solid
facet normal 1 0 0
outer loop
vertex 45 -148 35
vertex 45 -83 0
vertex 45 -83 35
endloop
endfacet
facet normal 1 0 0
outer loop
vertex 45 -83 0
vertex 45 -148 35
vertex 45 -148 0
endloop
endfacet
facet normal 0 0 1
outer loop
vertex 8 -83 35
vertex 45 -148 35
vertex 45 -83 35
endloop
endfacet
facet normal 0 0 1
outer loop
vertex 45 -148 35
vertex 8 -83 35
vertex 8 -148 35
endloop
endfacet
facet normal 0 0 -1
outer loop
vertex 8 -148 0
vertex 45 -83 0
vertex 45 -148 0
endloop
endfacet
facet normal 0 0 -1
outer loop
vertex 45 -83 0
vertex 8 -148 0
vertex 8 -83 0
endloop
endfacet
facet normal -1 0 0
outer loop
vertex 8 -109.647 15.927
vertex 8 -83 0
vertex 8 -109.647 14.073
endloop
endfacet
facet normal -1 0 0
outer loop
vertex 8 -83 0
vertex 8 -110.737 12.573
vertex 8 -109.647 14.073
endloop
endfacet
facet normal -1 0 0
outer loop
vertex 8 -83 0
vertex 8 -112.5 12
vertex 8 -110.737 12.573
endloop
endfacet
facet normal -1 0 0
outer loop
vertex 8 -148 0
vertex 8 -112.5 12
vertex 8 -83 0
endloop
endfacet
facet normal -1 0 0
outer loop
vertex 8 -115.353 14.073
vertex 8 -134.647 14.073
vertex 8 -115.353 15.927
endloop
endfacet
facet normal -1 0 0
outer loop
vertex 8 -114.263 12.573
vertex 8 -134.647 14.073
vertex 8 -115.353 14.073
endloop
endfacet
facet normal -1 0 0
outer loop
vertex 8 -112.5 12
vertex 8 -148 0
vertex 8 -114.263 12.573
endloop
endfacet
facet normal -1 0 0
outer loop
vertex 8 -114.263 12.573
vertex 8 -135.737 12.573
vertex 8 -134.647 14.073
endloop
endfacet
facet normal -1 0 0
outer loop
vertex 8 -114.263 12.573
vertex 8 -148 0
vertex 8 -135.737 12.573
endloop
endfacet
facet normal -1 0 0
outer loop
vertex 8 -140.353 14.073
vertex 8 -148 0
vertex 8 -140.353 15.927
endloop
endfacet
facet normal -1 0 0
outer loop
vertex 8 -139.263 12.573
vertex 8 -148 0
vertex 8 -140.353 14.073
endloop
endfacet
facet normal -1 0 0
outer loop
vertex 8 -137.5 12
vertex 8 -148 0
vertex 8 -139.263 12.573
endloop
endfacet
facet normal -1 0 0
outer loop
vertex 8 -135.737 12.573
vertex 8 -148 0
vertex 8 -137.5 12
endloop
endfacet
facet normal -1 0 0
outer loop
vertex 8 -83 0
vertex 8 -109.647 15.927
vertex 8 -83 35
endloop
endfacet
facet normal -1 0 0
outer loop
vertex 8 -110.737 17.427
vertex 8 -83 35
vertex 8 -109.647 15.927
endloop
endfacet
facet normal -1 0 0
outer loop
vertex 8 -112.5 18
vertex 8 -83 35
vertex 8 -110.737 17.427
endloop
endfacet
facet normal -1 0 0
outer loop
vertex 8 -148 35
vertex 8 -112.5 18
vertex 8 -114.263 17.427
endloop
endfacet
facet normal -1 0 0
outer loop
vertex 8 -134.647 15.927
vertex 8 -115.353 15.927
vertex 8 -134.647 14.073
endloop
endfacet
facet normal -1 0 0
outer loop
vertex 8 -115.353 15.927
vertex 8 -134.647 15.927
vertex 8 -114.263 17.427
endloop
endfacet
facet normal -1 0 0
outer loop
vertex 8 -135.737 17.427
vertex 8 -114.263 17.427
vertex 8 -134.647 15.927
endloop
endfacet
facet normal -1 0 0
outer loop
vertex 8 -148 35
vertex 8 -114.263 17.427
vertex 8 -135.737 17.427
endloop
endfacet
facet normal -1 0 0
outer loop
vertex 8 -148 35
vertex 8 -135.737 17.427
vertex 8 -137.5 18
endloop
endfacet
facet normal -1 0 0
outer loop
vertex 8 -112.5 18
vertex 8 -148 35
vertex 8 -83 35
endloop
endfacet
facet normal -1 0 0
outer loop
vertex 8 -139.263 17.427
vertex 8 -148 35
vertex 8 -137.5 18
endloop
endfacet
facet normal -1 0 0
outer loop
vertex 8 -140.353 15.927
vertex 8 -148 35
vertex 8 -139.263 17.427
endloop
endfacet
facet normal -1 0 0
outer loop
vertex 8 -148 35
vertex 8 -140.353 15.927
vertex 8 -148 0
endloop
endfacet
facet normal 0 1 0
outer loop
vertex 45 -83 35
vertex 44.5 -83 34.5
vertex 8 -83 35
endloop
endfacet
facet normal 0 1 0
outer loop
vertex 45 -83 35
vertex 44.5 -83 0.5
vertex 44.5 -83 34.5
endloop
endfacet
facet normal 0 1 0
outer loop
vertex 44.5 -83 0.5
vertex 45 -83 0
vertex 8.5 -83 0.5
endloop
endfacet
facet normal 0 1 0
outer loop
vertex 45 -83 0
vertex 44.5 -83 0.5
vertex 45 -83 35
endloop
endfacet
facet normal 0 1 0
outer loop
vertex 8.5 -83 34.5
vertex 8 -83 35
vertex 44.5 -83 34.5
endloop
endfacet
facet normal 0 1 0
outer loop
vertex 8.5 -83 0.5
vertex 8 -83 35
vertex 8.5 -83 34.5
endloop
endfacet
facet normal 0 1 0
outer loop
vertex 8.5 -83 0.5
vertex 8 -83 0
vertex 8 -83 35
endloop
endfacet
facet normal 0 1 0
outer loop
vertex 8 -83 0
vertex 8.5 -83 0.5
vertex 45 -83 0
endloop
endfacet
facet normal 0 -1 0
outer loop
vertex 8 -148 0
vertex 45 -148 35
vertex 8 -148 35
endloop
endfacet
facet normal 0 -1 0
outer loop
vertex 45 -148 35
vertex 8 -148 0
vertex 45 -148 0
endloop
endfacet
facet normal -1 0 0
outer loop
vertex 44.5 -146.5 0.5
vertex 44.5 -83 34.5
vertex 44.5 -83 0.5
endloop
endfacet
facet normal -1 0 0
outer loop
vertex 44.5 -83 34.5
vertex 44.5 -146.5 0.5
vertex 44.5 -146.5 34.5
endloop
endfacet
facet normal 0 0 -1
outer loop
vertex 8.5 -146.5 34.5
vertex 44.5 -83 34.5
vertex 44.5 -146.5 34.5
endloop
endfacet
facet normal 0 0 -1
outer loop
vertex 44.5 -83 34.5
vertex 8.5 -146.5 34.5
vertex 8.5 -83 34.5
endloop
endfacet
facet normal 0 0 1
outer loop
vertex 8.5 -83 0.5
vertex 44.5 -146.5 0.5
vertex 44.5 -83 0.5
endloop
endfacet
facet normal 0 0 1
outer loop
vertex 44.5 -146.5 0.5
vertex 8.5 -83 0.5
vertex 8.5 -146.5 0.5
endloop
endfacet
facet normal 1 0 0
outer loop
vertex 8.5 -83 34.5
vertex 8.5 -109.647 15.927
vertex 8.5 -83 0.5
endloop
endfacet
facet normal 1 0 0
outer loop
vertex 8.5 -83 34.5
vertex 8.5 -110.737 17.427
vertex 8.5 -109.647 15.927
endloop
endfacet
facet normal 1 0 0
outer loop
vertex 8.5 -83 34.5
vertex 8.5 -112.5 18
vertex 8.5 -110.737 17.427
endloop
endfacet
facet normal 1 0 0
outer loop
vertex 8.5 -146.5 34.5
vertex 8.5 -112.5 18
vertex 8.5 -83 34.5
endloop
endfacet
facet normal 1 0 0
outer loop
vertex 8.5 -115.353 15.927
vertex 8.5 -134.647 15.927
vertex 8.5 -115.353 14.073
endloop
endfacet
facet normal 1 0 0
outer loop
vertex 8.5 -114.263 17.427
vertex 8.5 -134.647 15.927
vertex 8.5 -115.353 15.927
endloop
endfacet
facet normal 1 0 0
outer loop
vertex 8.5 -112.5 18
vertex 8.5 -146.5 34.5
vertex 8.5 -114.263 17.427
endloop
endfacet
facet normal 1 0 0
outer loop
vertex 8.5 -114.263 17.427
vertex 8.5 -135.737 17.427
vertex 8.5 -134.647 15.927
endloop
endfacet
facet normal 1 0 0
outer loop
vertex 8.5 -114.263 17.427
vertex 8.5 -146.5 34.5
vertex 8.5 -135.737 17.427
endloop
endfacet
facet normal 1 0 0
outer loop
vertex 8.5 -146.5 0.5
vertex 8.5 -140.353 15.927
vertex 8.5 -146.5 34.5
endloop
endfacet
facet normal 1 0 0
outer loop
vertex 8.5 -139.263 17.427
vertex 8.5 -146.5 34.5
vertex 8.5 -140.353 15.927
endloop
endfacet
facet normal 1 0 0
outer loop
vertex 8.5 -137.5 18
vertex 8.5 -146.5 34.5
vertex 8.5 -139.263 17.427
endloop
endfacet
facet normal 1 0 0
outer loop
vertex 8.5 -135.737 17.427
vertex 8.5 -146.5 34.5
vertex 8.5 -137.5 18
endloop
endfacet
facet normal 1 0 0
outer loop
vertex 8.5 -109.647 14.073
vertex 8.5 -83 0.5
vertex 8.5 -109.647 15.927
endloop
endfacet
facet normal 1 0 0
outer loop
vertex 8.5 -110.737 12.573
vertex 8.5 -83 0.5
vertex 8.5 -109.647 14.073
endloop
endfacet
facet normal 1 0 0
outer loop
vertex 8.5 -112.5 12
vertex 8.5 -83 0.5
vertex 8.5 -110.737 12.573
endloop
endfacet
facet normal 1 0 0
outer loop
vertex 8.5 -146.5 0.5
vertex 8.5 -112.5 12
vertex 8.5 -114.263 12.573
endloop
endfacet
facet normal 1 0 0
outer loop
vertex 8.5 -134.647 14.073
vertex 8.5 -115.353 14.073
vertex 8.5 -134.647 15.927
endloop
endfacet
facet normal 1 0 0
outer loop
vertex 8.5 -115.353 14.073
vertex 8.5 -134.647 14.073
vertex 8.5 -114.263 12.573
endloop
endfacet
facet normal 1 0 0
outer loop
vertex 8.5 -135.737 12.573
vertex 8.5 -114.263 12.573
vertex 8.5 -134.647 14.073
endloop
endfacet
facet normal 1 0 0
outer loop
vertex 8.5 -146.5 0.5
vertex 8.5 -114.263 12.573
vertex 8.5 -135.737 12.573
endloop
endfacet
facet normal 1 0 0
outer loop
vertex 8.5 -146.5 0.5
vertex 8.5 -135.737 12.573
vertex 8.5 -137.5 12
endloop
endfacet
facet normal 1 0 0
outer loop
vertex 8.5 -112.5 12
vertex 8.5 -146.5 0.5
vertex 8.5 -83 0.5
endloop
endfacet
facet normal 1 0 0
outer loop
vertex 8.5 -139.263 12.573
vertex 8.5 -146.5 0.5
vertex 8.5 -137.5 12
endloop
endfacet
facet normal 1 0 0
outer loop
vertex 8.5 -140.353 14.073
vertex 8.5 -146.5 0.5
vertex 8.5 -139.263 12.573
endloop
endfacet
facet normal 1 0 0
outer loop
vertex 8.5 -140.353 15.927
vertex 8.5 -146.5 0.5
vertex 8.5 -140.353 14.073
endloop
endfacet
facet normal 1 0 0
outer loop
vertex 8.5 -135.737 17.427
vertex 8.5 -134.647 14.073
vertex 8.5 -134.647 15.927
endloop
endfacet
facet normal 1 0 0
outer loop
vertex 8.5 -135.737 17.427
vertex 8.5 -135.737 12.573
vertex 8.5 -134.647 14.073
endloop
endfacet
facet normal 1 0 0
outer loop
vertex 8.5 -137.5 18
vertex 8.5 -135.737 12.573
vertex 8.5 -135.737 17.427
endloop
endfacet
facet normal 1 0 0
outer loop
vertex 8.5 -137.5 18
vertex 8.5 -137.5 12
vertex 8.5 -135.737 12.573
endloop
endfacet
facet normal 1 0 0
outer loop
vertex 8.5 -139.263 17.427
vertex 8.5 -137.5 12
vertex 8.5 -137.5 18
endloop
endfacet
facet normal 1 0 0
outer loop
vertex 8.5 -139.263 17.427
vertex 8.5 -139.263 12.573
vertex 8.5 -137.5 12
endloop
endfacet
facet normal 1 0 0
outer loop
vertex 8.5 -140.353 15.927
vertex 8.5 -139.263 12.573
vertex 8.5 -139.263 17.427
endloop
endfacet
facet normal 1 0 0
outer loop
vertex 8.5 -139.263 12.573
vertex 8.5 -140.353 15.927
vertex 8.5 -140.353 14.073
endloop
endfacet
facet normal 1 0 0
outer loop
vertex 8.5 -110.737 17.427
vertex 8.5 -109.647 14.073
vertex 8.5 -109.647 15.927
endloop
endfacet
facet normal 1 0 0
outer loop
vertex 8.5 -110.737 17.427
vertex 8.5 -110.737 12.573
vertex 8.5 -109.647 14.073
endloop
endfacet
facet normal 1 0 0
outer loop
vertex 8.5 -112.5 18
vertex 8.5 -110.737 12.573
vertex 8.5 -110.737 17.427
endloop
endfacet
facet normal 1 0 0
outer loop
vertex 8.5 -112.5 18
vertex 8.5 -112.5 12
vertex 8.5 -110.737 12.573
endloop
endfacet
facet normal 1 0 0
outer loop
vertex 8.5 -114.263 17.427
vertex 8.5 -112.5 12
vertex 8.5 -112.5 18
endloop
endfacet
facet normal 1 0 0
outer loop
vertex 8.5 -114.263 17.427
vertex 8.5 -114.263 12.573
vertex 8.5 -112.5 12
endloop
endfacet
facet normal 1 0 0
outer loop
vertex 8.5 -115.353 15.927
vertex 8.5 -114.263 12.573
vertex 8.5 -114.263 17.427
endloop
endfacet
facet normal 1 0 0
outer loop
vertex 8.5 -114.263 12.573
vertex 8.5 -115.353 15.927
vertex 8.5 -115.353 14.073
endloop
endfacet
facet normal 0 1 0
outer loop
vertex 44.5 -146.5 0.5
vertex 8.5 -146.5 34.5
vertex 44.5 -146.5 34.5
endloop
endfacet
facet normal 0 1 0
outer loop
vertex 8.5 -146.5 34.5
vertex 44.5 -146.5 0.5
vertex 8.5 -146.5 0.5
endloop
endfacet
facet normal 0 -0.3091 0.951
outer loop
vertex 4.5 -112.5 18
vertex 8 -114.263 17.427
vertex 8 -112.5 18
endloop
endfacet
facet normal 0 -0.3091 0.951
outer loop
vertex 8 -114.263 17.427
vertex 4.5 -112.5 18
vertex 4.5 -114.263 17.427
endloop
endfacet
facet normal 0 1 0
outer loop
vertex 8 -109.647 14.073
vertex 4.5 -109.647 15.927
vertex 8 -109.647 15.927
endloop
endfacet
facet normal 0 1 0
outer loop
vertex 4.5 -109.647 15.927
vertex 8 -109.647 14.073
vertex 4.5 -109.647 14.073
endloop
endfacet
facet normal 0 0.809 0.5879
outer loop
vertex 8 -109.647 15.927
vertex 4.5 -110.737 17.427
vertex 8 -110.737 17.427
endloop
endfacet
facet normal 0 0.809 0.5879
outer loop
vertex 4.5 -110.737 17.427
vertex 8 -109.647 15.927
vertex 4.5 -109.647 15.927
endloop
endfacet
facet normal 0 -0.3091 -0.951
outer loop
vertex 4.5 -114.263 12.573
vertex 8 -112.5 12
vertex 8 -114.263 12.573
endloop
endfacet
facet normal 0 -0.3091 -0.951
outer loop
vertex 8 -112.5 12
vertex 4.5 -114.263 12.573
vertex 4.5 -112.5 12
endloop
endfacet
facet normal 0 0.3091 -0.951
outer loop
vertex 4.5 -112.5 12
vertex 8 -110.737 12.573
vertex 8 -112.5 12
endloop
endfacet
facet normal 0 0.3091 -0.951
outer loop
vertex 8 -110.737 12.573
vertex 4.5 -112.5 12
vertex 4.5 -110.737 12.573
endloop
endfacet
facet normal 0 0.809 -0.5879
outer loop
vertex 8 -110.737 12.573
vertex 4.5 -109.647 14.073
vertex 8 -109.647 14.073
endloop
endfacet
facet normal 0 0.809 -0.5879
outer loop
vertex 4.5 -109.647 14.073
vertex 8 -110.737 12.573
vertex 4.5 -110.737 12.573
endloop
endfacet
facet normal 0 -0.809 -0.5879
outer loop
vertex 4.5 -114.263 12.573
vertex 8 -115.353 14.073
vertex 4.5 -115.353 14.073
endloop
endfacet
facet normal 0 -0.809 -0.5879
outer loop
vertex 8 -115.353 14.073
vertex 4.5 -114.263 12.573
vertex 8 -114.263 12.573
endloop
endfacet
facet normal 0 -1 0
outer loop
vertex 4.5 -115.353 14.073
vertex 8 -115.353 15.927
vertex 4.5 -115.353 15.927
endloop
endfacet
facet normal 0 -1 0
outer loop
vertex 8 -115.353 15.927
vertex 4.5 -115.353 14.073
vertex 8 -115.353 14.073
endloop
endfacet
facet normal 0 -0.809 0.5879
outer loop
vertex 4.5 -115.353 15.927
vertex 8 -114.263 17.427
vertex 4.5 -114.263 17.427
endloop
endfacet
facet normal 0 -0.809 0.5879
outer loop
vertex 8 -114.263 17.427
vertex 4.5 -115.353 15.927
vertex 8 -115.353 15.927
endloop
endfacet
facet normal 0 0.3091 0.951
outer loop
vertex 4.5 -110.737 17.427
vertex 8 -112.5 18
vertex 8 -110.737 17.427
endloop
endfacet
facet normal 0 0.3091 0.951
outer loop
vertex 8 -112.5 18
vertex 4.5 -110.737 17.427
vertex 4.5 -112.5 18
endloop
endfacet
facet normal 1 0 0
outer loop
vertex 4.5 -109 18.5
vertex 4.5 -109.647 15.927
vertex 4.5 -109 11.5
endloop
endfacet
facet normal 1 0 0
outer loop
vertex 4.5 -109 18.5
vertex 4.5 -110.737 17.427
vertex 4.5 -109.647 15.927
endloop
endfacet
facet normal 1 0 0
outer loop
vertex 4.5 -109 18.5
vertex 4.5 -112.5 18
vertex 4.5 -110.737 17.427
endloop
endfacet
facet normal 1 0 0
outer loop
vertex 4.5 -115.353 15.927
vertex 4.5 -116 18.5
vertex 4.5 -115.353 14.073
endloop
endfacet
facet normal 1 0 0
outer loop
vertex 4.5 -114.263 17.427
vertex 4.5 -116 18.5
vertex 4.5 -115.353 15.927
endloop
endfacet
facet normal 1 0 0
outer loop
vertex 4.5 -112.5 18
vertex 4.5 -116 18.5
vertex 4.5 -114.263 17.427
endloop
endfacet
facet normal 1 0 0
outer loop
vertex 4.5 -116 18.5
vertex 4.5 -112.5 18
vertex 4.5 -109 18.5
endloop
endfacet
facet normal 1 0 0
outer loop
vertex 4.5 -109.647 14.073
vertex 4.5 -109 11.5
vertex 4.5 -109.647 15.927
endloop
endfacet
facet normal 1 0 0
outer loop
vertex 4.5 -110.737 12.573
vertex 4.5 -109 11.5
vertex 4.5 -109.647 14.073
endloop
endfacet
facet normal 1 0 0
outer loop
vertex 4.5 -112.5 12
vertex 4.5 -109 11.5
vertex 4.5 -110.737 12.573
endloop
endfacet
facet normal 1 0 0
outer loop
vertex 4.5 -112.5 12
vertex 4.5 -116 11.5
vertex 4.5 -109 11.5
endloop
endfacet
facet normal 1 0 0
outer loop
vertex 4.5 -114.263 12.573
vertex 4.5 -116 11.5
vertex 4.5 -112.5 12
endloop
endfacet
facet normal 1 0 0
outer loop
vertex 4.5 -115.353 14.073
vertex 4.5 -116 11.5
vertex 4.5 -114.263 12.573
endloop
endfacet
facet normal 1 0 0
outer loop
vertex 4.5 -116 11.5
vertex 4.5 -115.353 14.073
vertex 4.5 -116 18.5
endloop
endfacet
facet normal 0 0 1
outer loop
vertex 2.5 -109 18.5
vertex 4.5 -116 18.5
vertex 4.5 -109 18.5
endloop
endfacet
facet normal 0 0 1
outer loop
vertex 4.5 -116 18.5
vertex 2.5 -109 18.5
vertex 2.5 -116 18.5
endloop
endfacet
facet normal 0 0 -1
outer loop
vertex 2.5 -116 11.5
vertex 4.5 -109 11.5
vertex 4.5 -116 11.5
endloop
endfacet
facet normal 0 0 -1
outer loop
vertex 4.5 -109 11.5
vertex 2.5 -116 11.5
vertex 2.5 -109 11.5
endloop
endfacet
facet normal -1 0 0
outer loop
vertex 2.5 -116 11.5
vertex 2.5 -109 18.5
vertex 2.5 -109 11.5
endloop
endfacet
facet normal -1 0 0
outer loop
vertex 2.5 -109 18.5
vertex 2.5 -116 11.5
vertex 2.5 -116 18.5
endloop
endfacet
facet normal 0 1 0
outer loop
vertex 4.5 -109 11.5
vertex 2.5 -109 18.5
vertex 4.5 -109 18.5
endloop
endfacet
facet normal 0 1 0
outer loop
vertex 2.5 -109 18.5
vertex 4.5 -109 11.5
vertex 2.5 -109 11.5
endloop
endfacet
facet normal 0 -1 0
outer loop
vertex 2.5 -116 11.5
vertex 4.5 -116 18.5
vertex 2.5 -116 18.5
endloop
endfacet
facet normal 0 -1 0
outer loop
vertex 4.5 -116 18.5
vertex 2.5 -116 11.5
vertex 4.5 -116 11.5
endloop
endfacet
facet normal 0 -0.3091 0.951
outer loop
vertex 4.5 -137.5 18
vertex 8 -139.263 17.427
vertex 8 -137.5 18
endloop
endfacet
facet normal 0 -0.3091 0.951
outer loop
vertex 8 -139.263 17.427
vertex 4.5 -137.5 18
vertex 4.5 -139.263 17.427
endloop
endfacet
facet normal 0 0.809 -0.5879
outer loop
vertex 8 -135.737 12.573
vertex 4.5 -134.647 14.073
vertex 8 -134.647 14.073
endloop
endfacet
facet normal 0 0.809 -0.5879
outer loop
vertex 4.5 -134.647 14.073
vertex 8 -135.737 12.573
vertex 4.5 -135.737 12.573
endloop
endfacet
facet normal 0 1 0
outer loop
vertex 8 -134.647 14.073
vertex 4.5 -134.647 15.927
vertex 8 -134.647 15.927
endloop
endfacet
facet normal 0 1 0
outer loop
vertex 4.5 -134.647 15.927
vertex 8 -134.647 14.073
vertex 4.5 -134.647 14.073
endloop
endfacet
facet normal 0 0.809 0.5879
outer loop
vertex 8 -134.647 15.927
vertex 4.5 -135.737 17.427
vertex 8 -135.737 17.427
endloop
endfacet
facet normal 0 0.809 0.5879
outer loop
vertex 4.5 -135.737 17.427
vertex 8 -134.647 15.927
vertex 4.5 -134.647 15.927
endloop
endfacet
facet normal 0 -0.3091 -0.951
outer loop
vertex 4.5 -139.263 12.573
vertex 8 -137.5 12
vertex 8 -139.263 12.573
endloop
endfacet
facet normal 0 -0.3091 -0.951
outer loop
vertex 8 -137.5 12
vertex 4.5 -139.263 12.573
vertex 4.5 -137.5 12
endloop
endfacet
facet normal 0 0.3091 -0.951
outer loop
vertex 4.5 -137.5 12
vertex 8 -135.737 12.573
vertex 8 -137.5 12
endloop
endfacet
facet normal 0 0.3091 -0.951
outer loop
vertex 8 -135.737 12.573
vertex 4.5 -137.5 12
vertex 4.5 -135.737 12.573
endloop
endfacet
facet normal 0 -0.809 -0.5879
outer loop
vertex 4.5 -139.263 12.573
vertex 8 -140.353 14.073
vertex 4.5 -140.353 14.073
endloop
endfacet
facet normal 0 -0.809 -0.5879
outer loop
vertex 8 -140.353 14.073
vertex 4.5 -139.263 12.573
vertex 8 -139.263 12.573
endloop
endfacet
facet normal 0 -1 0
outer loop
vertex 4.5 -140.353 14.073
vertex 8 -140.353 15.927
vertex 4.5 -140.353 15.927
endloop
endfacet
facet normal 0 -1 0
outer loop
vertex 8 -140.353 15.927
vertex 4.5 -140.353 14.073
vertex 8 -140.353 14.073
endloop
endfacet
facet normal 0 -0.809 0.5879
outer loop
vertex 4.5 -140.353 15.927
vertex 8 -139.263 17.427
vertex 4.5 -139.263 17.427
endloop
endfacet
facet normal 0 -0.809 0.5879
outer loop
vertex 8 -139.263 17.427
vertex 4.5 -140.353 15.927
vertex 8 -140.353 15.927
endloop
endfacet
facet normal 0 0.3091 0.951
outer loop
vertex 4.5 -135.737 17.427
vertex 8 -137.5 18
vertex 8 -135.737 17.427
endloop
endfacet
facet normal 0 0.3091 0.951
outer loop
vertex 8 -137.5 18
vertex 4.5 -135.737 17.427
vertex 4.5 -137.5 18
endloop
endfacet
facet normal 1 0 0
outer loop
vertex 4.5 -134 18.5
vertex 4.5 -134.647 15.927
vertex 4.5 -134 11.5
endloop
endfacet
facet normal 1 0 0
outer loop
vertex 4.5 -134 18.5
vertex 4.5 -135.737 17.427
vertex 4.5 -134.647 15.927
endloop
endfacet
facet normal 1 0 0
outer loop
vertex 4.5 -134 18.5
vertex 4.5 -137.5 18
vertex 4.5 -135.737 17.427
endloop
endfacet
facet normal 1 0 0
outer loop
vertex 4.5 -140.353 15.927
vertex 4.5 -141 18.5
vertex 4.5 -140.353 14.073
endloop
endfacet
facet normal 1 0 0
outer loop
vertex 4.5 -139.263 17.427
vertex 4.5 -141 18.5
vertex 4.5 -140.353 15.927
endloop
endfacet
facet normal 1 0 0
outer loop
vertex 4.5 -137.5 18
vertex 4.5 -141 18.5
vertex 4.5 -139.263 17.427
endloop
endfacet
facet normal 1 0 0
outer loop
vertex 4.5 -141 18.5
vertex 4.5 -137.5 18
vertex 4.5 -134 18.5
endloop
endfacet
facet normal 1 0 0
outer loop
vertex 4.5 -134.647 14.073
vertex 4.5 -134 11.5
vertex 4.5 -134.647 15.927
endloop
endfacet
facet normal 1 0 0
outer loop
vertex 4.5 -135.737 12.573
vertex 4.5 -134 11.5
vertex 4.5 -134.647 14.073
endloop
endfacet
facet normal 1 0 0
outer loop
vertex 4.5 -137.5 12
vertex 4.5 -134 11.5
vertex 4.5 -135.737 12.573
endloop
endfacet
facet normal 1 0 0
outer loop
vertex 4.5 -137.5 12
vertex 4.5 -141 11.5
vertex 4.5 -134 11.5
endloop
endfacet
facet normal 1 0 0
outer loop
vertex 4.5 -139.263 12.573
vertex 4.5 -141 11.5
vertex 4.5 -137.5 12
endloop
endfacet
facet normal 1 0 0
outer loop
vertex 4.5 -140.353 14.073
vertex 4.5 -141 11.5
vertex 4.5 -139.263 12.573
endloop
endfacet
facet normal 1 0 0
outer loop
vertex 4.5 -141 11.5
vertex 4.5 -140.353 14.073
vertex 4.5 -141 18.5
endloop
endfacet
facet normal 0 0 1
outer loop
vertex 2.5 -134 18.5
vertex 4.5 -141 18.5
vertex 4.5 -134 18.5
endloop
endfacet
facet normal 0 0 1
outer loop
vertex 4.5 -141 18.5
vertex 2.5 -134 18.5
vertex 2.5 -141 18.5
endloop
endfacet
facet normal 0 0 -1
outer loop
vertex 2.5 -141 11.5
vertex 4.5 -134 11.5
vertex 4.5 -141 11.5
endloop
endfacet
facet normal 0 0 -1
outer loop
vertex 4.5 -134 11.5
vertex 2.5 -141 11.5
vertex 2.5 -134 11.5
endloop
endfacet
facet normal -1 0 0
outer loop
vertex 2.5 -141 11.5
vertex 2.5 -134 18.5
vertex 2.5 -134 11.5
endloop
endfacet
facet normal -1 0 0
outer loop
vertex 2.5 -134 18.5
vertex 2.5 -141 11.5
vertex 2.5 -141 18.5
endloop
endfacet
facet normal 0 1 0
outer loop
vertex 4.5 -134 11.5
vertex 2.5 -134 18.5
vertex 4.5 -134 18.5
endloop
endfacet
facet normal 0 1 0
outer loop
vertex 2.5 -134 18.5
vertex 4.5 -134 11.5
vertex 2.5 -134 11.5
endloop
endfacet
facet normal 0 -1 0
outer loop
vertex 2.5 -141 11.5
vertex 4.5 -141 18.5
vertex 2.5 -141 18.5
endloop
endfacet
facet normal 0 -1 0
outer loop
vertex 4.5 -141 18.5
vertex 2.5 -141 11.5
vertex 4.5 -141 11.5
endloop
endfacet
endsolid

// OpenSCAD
//Hülle
difference(){
    
translate([8,-148,0])
cube([37,65,35]);

translate([8.5,-146.5,0.5])
 cube([36,64,34]);}   
 //Befestigung Brille1
    translate([3.5,-112.5,15])
    rotate([0,90,0])
    cylinder(d=6,h=5);
    translate([2.5,-116,11.5])
    cube([2,7,7]);
    

//Befestigung Brille2
    translate([3.5,-137.5,15])
    rotate([0,90,0])
    cylinder(d=6,h=5);
    translate([2.5,-141,11.5])
    cube([2,7,7]);
